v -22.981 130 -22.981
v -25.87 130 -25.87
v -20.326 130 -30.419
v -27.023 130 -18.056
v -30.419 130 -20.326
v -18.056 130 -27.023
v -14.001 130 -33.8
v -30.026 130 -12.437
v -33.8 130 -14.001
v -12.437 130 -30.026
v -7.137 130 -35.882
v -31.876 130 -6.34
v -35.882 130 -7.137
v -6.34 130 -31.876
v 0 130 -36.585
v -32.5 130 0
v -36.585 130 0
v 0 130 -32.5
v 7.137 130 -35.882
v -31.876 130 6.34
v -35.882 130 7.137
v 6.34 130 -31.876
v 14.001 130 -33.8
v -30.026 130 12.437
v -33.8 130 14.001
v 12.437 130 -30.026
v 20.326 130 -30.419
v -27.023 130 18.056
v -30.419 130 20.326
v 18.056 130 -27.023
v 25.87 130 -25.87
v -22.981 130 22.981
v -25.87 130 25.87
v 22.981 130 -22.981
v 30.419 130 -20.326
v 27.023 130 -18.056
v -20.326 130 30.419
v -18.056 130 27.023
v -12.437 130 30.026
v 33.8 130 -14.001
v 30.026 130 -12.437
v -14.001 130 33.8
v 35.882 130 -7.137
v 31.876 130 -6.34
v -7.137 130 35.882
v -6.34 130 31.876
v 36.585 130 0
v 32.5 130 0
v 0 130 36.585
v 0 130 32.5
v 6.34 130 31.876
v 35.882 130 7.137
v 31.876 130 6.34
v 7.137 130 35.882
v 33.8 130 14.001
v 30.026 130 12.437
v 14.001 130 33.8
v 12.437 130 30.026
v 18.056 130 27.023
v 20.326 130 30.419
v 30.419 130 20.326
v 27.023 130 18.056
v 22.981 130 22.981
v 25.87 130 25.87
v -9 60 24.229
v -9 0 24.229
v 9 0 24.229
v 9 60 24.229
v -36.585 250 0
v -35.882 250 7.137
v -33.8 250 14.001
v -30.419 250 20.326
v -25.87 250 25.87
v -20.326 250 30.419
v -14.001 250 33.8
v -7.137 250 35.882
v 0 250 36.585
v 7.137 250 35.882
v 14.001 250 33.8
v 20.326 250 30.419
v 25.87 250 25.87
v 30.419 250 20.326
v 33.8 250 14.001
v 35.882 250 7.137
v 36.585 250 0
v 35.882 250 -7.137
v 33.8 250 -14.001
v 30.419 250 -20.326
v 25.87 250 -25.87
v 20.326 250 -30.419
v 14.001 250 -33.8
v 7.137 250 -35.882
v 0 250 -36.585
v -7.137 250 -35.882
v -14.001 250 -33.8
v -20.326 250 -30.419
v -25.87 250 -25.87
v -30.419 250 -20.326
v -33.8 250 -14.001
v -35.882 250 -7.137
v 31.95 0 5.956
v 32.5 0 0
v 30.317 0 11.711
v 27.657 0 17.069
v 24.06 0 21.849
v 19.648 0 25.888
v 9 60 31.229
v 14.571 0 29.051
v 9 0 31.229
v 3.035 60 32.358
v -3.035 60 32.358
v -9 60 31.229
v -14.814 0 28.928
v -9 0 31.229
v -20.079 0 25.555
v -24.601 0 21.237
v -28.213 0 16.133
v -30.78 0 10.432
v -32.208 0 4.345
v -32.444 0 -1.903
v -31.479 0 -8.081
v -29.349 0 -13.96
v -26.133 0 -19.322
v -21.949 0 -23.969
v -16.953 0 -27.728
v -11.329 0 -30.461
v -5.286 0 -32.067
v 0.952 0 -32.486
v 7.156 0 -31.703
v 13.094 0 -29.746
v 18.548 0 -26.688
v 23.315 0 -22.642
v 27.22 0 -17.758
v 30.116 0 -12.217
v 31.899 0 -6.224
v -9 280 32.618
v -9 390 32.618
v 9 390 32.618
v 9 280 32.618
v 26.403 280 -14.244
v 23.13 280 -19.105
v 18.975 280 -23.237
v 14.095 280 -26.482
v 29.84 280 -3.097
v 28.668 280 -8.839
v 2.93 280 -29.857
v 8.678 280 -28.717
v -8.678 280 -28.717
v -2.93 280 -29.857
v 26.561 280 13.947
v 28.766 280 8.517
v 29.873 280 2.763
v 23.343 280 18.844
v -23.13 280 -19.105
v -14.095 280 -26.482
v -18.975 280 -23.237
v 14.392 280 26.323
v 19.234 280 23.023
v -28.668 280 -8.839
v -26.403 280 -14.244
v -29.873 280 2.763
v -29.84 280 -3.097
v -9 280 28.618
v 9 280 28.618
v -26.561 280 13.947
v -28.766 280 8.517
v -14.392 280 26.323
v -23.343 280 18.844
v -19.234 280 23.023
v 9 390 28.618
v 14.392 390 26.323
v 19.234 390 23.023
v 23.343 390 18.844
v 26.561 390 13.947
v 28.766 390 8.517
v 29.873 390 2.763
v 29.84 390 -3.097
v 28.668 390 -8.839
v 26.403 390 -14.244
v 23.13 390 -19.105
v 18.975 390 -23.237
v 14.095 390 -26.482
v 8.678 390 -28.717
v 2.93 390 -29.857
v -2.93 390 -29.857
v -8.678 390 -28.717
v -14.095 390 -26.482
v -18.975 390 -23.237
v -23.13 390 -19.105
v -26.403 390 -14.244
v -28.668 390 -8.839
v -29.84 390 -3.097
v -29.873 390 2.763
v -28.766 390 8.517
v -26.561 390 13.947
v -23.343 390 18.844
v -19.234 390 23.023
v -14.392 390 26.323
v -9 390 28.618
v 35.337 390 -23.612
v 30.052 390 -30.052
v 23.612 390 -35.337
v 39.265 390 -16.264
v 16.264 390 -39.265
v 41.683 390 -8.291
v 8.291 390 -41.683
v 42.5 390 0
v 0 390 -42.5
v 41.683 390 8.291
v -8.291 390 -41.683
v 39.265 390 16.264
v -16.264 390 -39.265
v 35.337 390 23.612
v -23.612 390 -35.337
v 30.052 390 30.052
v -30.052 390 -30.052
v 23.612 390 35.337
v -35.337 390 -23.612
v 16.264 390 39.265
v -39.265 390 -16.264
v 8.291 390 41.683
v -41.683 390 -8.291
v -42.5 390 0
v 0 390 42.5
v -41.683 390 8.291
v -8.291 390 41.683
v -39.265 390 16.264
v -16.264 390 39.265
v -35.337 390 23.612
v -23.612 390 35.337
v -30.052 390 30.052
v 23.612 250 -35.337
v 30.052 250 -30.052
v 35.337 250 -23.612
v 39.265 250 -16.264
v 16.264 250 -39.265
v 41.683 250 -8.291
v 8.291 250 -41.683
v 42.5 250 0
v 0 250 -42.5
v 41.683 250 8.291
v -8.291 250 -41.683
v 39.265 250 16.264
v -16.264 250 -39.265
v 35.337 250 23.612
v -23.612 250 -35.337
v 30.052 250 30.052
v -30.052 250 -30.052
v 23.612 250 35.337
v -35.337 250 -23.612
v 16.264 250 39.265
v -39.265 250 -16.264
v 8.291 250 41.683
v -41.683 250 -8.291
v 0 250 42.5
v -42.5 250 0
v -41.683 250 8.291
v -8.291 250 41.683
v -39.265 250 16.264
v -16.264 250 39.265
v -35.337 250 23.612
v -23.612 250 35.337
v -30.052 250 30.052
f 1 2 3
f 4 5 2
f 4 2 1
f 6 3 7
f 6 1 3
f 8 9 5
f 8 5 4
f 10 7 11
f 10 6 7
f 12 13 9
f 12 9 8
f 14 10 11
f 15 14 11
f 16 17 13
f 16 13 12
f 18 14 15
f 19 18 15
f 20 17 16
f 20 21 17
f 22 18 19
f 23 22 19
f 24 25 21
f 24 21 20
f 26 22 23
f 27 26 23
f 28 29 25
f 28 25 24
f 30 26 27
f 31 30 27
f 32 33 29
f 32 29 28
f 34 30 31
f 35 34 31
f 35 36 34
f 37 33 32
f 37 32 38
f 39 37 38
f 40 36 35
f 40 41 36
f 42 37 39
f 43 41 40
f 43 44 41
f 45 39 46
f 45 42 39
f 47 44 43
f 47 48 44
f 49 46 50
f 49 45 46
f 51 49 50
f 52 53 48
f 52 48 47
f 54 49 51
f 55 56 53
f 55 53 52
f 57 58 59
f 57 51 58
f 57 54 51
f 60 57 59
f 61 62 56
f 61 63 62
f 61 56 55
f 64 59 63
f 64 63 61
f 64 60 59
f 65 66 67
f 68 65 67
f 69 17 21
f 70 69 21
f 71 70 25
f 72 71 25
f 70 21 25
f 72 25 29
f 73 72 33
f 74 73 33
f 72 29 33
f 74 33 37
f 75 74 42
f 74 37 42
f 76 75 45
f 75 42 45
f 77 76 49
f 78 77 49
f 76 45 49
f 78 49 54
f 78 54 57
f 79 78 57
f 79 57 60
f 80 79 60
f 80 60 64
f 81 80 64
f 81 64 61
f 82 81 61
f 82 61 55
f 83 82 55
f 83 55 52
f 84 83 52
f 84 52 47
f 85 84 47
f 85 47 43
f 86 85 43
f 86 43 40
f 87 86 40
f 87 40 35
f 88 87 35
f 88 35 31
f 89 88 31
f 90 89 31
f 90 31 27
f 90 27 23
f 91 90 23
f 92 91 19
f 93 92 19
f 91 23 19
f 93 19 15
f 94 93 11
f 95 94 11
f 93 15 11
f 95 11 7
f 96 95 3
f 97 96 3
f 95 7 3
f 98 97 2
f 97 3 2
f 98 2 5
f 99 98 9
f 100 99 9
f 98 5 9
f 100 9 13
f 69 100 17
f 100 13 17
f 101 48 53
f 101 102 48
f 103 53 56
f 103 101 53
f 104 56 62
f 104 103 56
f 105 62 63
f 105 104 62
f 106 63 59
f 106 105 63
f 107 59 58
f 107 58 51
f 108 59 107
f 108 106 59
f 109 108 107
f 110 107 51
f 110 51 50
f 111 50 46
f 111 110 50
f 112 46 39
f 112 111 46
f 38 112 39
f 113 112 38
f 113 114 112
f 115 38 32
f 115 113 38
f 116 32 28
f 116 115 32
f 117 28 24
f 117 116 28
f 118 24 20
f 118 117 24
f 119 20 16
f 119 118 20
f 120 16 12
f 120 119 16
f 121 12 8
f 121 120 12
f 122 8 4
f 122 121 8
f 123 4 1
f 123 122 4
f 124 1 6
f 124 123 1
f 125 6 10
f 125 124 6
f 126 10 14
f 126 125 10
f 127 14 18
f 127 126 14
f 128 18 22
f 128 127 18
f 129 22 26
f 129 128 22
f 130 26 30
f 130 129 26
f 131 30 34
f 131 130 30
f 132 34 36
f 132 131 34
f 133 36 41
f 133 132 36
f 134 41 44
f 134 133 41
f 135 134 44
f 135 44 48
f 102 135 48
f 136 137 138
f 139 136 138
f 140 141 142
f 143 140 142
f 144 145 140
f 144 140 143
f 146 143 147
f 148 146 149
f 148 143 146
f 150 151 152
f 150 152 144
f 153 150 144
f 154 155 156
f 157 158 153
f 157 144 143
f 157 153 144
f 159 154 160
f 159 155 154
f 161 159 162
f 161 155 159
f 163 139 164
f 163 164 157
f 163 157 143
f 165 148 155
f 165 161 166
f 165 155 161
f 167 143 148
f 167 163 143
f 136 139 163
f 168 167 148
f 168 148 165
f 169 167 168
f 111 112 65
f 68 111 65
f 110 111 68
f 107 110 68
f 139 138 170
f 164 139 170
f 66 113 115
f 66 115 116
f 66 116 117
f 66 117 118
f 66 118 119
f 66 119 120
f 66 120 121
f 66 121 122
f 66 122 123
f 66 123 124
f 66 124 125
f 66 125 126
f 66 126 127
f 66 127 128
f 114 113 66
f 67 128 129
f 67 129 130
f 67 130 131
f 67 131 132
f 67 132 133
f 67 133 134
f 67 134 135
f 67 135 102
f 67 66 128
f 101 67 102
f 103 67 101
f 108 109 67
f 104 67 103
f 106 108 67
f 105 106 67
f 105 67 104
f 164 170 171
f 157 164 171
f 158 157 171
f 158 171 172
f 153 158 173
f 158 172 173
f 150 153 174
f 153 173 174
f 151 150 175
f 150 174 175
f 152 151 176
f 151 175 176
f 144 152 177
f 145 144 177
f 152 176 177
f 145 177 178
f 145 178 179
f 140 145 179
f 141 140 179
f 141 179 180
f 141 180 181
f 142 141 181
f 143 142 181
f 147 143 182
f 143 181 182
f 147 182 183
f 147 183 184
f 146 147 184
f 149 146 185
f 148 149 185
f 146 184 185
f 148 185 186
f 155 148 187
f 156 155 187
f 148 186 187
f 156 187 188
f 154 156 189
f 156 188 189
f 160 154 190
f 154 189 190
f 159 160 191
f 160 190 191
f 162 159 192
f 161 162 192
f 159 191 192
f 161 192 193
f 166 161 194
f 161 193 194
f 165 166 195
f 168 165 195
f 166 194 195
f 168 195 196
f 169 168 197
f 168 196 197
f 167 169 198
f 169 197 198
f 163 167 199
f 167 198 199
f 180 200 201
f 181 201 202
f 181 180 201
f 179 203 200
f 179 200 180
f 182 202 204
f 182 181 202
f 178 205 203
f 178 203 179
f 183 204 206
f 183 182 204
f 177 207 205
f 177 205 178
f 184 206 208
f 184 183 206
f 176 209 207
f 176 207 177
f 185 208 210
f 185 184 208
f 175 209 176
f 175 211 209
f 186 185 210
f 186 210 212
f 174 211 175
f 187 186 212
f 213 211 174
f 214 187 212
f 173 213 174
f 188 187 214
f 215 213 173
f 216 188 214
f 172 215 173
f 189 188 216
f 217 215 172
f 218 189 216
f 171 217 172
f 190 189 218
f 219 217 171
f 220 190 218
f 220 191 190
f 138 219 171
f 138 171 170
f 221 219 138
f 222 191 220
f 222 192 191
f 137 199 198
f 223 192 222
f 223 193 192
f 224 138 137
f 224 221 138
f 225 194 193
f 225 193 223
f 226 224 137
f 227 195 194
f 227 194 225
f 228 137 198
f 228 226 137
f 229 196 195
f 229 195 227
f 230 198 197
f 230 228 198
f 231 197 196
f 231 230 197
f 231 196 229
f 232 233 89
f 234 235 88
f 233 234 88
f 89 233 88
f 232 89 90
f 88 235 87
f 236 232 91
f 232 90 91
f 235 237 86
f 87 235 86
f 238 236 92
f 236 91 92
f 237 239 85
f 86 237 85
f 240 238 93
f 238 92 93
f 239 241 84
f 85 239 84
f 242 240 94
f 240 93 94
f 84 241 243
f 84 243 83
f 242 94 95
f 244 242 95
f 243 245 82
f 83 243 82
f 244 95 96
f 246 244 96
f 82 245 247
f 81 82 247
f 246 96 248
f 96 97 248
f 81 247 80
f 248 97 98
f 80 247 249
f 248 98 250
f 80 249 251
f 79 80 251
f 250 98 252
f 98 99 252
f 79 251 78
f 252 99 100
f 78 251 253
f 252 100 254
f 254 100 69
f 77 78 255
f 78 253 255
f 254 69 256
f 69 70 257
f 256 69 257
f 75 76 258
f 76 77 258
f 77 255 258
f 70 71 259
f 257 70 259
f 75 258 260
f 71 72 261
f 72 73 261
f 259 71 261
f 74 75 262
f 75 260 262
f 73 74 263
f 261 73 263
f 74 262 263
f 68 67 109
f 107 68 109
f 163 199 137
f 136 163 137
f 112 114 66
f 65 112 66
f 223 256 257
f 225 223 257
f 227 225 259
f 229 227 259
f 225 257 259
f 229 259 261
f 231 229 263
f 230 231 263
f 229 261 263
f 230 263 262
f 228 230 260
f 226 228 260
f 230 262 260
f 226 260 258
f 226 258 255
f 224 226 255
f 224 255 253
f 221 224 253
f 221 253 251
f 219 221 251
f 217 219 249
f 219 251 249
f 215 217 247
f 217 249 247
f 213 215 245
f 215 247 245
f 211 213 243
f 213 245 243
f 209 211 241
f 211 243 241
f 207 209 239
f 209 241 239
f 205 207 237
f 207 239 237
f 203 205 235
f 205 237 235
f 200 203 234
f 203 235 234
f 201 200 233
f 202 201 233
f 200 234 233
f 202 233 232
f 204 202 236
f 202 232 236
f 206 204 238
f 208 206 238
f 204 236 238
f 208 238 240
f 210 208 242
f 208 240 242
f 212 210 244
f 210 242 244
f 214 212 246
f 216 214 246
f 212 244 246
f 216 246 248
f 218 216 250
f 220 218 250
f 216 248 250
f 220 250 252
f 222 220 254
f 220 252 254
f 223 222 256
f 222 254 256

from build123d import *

# Parameters (mm, degrees)
F0_R      = 32.5
F1_DEPTH  = 100
F2_R      = 36.5851523514
F3_DEPTH  = 150
F4_R      = 42.5
F5_DEPTH  = 140
F7_DEPTH  = 110
F9_DEPTH  = 60
F10_R     = 36.5851523514
F10_R_2   = 32.5
F11_DEPTH = 30


with BuildPart() as f1:
    # F0 (on Front) → F1 (new body)
    with BuildSketch(Plane.XZ):
        Circle(F0_R)
    extrude(amount=-F1_DEPTH)

    # F2 (on face) → F3 (join)
    with BuildSketch(Plane(origin=(0, 100, 0), x_dir=(-1, 0, 0), z_dir=(0, 1, 0))):
        Circle(F2_R)
    extrude(amount=F3_DEPTH)

    # F4 (on face) → F5 (join)
    with BuildSketch(Plane(origin=(0, 250, 0), x_dir=(-1, 0, 0), z_dir=(0, 1, 0))):
        Circle(F4_R)
    extrude(amount=F5_DEPTH)

    # F6 (on face) → F7 (cut)
    with BuildSketch(Plane(origin=(0, 390, 0), x_dir=(-1, 0, 0), z_dir=(0, 1, 0))):
        with BuildLine():
            Line((-9, 32.6181760425), (-9, 28.6181760425))
            ThreePointArc((-9, 28.6181760425), (0, -30), (9, 28.6181760425))
            Line((9, 28.6181760425), (9, 32.6181760425))
            Line((9, 32.6181760425), (-9, 32.6181760425))
        make_face()
    extrude(amount=-F7_DEPTH, mode=Mode.SUBTRACT)

    # F8 (on face) → F9 (cut)
    with BuildSketch(Plane.XZ):
        with BuildLine():
            ThreePointArc((9, 31.2289929393), (0, 32.5), (-9, 31.2289929393))
            Line((-9, 31.2289929393), (-9, 24.2289929393))
            Line((-9, 24.2289929393), (9, 24.2289929393))
            Line((9, 24.2289929393), (9, 31.2289929393))
        make_face()
    extrude(amount=-F9_DEPTH, mode=Mode.SUBTRACT)

    # F10 (on face) → F11 (cut)
    with BuildSketch(Plane.XZ.offset(-100)):
        Circle(F10_R)
        Circle(F10_R_2, mode=Mode.SUBTRACT)
    extrude(amount=-F11_DEPTH, mode=Mode.SUBTRACT)


solid = f1.part
